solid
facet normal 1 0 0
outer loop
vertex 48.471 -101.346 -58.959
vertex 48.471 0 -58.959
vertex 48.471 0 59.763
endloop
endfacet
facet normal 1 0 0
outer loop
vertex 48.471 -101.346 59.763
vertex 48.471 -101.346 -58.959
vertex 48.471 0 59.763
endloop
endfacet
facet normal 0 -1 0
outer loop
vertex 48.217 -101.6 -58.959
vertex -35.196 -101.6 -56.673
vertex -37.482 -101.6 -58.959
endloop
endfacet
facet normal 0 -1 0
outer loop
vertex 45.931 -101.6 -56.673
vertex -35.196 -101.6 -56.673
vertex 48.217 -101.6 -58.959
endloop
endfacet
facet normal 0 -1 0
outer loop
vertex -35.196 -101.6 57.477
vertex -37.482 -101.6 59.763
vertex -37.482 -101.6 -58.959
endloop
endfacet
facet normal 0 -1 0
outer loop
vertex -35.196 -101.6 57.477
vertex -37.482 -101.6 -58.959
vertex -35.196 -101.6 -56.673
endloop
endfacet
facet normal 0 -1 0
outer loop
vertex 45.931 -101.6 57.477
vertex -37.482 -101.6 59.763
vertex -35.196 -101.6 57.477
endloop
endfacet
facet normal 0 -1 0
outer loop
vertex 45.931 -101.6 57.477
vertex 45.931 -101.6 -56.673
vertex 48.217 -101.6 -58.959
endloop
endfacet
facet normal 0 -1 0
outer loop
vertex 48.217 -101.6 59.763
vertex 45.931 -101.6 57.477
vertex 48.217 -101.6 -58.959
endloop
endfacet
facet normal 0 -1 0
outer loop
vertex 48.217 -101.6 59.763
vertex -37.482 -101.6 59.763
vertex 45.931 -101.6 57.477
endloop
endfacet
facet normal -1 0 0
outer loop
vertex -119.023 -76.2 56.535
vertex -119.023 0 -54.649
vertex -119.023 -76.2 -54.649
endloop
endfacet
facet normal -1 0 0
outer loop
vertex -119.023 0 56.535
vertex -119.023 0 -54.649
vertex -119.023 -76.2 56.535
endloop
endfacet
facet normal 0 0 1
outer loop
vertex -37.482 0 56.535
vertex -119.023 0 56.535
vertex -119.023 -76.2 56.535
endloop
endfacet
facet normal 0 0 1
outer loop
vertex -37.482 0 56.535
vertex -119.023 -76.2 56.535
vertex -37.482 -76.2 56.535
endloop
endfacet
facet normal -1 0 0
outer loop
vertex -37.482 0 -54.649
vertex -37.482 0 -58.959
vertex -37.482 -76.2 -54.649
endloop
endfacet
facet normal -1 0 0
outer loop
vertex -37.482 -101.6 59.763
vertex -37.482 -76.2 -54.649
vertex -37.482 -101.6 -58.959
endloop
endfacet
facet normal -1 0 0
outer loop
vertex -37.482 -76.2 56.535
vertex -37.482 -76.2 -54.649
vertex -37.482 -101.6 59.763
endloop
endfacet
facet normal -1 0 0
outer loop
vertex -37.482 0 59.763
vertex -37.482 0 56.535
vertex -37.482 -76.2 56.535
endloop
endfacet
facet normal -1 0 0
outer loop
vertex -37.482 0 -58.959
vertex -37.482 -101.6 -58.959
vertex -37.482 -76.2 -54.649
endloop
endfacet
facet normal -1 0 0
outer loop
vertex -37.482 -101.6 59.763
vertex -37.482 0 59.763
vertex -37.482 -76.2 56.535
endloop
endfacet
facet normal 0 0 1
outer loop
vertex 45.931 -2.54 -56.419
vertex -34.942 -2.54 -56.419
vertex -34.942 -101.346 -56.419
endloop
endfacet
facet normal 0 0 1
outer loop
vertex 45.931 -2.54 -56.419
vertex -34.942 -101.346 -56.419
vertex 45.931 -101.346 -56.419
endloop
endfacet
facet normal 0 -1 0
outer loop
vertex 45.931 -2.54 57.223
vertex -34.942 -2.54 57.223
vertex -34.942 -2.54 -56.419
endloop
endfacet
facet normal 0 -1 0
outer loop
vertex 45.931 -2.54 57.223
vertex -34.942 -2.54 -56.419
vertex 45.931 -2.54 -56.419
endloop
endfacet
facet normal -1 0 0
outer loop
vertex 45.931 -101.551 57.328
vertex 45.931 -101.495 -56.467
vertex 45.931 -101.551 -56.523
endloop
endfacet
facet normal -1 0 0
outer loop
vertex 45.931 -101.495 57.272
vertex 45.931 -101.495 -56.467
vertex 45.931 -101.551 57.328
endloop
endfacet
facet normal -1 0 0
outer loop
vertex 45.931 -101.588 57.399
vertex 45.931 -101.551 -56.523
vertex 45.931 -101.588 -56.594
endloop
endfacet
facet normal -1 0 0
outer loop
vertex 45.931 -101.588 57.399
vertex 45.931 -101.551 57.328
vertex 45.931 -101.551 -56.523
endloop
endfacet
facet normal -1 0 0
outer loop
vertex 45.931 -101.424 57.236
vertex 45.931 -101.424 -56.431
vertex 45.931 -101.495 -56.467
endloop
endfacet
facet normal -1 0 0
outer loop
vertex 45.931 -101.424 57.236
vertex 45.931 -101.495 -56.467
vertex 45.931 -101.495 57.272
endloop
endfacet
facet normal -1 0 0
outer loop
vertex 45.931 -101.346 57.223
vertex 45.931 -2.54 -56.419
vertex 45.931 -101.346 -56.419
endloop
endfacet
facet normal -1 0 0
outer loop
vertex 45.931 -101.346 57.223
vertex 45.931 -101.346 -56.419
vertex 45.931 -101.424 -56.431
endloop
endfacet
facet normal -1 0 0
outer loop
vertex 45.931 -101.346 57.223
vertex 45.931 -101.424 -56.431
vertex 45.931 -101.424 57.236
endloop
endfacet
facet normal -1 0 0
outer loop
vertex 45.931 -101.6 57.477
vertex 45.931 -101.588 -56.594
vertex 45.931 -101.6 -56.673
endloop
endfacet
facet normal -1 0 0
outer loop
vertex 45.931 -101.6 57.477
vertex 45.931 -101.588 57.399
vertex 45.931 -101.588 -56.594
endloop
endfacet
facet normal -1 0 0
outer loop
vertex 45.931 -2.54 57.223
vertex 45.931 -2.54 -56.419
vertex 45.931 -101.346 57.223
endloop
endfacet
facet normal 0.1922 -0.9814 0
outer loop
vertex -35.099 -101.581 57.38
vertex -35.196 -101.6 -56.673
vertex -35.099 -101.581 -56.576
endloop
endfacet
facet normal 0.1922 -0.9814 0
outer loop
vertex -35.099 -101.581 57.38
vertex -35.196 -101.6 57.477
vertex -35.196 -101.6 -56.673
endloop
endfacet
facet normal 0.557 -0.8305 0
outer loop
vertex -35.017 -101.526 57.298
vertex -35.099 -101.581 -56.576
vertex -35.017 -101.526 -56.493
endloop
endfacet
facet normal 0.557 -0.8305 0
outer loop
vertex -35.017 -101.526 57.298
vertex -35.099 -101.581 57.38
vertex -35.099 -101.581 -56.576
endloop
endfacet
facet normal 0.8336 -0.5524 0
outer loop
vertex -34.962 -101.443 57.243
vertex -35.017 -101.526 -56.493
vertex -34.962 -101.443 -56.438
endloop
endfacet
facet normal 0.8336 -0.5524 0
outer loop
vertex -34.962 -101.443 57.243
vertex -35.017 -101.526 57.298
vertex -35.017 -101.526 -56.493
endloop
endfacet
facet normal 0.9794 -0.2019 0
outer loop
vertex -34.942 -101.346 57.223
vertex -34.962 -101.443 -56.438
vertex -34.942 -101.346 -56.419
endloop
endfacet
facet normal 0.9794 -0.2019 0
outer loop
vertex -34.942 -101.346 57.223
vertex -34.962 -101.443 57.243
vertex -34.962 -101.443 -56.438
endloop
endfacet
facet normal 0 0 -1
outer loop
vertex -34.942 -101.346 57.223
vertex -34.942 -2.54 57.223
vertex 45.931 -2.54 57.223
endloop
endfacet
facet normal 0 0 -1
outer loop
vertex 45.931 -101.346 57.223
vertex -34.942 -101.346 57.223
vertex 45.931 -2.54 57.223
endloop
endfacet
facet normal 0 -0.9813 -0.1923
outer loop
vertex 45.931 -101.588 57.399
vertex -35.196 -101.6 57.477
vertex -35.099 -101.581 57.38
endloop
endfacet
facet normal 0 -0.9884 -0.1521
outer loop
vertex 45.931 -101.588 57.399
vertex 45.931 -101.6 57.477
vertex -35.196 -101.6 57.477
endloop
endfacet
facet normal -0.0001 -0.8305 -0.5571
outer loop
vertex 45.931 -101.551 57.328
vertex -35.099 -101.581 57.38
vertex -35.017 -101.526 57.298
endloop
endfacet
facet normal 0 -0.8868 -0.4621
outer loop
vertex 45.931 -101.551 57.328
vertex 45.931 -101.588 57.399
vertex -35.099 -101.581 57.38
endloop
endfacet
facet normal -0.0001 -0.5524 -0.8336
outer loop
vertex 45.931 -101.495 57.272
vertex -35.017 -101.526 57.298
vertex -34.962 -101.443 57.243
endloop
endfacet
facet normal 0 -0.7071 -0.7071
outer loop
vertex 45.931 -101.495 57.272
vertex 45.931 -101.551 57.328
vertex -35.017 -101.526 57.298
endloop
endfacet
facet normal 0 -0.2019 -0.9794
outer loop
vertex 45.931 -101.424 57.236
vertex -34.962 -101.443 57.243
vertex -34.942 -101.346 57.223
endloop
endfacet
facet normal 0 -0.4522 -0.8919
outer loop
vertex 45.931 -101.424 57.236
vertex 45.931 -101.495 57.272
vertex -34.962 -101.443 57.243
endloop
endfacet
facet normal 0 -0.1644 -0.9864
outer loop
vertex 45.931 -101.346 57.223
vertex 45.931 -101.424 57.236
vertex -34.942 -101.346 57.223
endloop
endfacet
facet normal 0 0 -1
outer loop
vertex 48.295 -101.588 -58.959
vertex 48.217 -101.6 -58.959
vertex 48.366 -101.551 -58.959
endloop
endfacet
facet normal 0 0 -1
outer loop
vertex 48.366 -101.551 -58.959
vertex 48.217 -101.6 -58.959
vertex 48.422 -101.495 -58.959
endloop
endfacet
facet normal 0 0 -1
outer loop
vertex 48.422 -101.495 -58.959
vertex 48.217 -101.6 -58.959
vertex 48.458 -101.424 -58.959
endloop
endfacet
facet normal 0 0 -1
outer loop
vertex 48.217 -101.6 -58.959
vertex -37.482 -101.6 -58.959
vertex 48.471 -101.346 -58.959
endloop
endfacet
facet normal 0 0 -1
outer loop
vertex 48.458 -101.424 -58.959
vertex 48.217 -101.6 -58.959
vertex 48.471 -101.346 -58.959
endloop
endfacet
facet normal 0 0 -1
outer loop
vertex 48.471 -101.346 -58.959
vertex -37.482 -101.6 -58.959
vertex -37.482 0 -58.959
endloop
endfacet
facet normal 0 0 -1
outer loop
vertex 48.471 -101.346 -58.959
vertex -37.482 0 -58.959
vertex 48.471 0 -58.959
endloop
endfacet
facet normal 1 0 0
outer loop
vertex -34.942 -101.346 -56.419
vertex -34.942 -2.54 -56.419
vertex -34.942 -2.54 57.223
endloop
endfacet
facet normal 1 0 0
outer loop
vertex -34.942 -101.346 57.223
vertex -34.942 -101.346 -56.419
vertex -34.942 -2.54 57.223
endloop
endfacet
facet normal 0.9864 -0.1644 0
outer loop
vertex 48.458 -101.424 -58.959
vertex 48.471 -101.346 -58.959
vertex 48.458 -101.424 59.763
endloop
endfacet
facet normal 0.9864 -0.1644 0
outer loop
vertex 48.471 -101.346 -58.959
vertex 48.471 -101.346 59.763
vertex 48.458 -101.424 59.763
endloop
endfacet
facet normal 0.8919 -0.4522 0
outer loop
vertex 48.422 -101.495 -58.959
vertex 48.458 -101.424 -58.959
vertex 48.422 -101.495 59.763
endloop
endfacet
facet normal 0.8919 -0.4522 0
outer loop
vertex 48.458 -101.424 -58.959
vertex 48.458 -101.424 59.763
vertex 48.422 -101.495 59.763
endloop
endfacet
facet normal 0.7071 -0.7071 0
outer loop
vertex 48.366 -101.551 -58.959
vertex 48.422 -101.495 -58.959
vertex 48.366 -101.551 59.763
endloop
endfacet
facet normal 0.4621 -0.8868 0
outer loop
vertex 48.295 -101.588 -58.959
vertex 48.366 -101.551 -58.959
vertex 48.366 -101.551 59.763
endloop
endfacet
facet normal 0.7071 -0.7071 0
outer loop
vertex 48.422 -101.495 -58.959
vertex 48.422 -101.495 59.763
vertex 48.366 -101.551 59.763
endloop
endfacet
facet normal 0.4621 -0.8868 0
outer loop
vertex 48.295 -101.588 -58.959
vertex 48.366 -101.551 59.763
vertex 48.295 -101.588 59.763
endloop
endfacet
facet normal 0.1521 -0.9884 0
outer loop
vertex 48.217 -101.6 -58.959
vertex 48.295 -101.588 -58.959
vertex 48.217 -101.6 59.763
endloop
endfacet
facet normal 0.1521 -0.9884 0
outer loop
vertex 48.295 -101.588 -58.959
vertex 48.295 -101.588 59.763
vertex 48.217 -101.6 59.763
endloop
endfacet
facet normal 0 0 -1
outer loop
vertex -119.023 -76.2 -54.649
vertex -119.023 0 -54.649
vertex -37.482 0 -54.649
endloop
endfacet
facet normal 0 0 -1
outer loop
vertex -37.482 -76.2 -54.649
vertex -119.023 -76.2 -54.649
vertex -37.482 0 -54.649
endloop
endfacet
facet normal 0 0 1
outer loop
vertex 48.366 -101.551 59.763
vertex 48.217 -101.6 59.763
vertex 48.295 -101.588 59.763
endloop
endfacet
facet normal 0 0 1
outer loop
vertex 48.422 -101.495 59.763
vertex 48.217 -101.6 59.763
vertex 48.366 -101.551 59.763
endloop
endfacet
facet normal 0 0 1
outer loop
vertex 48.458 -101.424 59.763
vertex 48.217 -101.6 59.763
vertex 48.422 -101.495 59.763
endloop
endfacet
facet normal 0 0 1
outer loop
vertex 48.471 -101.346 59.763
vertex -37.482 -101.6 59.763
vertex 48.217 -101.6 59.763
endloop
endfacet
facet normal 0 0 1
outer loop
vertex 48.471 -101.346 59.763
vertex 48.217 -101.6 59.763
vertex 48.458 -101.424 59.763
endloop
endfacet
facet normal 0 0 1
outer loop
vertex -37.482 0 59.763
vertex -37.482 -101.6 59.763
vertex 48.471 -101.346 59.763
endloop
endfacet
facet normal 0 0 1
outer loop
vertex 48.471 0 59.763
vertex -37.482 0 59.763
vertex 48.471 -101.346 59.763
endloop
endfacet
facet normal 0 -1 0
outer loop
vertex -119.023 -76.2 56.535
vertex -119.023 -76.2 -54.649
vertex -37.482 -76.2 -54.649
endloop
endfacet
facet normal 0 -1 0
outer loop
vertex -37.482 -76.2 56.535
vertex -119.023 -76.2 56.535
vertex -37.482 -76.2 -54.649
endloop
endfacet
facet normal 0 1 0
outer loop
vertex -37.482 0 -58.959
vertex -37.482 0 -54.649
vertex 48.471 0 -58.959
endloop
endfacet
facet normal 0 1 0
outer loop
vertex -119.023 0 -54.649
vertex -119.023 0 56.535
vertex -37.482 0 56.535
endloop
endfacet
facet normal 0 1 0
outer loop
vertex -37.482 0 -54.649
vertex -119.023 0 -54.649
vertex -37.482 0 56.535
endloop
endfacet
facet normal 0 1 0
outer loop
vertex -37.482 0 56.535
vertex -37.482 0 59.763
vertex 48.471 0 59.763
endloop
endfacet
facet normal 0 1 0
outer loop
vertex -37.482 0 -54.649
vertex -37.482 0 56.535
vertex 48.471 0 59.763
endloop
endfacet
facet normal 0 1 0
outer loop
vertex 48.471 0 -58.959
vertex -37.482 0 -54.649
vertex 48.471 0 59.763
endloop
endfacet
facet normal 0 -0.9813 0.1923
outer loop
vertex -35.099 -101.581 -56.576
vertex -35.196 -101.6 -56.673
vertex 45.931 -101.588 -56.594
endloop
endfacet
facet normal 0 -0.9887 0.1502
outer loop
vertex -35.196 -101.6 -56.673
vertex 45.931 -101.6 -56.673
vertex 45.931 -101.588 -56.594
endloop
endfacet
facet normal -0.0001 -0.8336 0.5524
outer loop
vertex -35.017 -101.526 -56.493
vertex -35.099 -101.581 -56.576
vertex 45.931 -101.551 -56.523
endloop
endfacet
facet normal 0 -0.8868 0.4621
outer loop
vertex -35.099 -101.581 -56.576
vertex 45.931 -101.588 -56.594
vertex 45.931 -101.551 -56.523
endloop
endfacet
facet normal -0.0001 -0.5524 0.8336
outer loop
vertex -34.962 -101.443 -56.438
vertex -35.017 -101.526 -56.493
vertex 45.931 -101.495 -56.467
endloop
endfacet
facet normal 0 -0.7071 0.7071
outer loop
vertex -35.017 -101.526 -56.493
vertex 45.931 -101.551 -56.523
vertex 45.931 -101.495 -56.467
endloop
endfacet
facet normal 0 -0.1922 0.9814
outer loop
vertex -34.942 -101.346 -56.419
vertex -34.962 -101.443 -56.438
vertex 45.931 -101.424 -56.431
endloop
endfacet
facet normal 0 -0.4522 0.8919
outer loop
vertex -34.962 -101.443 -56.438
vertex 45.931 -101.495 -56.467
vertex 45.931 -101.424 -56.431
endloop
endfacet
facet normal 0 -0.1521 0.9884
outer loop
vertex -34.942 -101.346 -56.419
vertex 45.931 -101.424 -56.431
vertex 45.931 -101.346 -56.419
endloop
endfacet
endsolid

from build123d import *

# Parameters (mm, degrees)
F0_W     = 85.953310132
F0_H     = 118.7221929431
F1_DEPTH = 101.6
F3_T     = -2.54
F4_R     = 0.254
F2_W     = 81.6747397184
F2_H     = 111.1846715212
F5_DEPTH = 76.2


with BuildPart() as f1:
    # F0 (on Front) → F1 (new body)
    with BuildSketch(Plane.XZ):
        with Locations((5.494184792, 0.4023127258)):
            Rectangle(F0_W, F0_H)
    extrude(amount=F1_DEPTH)

    # F3
    f3_openings = [f1.faces().sort_by_distance(p)[0] for p in [
        (5.494185, -101.6, 0.402313),
    ]]
    offset(amount=F3_T, openings=f3_openings)

    # F4
    f4_edges = [f1.edges().sort_by_distance(p)[0] for p in [
        (48.47084, -101.6, 0.402313),
        (5.494185, -101.6, 57.223409),
        (-34.94247, -101.6, 0.402313),
        (5.494185, -101.6, -56.418784),
    ]]
    fillet(f4_edges, radius=F4_R)

    # F2 (on Front) → F5 (join)
    with BuildSketch(Plane.XZ):
        with Locations((-78.1854763627, 0.9429827332)):
            Rectangle(F2_W, F2_H)
    extrude(amount=F5_DEPTH)


solid = f1.part
